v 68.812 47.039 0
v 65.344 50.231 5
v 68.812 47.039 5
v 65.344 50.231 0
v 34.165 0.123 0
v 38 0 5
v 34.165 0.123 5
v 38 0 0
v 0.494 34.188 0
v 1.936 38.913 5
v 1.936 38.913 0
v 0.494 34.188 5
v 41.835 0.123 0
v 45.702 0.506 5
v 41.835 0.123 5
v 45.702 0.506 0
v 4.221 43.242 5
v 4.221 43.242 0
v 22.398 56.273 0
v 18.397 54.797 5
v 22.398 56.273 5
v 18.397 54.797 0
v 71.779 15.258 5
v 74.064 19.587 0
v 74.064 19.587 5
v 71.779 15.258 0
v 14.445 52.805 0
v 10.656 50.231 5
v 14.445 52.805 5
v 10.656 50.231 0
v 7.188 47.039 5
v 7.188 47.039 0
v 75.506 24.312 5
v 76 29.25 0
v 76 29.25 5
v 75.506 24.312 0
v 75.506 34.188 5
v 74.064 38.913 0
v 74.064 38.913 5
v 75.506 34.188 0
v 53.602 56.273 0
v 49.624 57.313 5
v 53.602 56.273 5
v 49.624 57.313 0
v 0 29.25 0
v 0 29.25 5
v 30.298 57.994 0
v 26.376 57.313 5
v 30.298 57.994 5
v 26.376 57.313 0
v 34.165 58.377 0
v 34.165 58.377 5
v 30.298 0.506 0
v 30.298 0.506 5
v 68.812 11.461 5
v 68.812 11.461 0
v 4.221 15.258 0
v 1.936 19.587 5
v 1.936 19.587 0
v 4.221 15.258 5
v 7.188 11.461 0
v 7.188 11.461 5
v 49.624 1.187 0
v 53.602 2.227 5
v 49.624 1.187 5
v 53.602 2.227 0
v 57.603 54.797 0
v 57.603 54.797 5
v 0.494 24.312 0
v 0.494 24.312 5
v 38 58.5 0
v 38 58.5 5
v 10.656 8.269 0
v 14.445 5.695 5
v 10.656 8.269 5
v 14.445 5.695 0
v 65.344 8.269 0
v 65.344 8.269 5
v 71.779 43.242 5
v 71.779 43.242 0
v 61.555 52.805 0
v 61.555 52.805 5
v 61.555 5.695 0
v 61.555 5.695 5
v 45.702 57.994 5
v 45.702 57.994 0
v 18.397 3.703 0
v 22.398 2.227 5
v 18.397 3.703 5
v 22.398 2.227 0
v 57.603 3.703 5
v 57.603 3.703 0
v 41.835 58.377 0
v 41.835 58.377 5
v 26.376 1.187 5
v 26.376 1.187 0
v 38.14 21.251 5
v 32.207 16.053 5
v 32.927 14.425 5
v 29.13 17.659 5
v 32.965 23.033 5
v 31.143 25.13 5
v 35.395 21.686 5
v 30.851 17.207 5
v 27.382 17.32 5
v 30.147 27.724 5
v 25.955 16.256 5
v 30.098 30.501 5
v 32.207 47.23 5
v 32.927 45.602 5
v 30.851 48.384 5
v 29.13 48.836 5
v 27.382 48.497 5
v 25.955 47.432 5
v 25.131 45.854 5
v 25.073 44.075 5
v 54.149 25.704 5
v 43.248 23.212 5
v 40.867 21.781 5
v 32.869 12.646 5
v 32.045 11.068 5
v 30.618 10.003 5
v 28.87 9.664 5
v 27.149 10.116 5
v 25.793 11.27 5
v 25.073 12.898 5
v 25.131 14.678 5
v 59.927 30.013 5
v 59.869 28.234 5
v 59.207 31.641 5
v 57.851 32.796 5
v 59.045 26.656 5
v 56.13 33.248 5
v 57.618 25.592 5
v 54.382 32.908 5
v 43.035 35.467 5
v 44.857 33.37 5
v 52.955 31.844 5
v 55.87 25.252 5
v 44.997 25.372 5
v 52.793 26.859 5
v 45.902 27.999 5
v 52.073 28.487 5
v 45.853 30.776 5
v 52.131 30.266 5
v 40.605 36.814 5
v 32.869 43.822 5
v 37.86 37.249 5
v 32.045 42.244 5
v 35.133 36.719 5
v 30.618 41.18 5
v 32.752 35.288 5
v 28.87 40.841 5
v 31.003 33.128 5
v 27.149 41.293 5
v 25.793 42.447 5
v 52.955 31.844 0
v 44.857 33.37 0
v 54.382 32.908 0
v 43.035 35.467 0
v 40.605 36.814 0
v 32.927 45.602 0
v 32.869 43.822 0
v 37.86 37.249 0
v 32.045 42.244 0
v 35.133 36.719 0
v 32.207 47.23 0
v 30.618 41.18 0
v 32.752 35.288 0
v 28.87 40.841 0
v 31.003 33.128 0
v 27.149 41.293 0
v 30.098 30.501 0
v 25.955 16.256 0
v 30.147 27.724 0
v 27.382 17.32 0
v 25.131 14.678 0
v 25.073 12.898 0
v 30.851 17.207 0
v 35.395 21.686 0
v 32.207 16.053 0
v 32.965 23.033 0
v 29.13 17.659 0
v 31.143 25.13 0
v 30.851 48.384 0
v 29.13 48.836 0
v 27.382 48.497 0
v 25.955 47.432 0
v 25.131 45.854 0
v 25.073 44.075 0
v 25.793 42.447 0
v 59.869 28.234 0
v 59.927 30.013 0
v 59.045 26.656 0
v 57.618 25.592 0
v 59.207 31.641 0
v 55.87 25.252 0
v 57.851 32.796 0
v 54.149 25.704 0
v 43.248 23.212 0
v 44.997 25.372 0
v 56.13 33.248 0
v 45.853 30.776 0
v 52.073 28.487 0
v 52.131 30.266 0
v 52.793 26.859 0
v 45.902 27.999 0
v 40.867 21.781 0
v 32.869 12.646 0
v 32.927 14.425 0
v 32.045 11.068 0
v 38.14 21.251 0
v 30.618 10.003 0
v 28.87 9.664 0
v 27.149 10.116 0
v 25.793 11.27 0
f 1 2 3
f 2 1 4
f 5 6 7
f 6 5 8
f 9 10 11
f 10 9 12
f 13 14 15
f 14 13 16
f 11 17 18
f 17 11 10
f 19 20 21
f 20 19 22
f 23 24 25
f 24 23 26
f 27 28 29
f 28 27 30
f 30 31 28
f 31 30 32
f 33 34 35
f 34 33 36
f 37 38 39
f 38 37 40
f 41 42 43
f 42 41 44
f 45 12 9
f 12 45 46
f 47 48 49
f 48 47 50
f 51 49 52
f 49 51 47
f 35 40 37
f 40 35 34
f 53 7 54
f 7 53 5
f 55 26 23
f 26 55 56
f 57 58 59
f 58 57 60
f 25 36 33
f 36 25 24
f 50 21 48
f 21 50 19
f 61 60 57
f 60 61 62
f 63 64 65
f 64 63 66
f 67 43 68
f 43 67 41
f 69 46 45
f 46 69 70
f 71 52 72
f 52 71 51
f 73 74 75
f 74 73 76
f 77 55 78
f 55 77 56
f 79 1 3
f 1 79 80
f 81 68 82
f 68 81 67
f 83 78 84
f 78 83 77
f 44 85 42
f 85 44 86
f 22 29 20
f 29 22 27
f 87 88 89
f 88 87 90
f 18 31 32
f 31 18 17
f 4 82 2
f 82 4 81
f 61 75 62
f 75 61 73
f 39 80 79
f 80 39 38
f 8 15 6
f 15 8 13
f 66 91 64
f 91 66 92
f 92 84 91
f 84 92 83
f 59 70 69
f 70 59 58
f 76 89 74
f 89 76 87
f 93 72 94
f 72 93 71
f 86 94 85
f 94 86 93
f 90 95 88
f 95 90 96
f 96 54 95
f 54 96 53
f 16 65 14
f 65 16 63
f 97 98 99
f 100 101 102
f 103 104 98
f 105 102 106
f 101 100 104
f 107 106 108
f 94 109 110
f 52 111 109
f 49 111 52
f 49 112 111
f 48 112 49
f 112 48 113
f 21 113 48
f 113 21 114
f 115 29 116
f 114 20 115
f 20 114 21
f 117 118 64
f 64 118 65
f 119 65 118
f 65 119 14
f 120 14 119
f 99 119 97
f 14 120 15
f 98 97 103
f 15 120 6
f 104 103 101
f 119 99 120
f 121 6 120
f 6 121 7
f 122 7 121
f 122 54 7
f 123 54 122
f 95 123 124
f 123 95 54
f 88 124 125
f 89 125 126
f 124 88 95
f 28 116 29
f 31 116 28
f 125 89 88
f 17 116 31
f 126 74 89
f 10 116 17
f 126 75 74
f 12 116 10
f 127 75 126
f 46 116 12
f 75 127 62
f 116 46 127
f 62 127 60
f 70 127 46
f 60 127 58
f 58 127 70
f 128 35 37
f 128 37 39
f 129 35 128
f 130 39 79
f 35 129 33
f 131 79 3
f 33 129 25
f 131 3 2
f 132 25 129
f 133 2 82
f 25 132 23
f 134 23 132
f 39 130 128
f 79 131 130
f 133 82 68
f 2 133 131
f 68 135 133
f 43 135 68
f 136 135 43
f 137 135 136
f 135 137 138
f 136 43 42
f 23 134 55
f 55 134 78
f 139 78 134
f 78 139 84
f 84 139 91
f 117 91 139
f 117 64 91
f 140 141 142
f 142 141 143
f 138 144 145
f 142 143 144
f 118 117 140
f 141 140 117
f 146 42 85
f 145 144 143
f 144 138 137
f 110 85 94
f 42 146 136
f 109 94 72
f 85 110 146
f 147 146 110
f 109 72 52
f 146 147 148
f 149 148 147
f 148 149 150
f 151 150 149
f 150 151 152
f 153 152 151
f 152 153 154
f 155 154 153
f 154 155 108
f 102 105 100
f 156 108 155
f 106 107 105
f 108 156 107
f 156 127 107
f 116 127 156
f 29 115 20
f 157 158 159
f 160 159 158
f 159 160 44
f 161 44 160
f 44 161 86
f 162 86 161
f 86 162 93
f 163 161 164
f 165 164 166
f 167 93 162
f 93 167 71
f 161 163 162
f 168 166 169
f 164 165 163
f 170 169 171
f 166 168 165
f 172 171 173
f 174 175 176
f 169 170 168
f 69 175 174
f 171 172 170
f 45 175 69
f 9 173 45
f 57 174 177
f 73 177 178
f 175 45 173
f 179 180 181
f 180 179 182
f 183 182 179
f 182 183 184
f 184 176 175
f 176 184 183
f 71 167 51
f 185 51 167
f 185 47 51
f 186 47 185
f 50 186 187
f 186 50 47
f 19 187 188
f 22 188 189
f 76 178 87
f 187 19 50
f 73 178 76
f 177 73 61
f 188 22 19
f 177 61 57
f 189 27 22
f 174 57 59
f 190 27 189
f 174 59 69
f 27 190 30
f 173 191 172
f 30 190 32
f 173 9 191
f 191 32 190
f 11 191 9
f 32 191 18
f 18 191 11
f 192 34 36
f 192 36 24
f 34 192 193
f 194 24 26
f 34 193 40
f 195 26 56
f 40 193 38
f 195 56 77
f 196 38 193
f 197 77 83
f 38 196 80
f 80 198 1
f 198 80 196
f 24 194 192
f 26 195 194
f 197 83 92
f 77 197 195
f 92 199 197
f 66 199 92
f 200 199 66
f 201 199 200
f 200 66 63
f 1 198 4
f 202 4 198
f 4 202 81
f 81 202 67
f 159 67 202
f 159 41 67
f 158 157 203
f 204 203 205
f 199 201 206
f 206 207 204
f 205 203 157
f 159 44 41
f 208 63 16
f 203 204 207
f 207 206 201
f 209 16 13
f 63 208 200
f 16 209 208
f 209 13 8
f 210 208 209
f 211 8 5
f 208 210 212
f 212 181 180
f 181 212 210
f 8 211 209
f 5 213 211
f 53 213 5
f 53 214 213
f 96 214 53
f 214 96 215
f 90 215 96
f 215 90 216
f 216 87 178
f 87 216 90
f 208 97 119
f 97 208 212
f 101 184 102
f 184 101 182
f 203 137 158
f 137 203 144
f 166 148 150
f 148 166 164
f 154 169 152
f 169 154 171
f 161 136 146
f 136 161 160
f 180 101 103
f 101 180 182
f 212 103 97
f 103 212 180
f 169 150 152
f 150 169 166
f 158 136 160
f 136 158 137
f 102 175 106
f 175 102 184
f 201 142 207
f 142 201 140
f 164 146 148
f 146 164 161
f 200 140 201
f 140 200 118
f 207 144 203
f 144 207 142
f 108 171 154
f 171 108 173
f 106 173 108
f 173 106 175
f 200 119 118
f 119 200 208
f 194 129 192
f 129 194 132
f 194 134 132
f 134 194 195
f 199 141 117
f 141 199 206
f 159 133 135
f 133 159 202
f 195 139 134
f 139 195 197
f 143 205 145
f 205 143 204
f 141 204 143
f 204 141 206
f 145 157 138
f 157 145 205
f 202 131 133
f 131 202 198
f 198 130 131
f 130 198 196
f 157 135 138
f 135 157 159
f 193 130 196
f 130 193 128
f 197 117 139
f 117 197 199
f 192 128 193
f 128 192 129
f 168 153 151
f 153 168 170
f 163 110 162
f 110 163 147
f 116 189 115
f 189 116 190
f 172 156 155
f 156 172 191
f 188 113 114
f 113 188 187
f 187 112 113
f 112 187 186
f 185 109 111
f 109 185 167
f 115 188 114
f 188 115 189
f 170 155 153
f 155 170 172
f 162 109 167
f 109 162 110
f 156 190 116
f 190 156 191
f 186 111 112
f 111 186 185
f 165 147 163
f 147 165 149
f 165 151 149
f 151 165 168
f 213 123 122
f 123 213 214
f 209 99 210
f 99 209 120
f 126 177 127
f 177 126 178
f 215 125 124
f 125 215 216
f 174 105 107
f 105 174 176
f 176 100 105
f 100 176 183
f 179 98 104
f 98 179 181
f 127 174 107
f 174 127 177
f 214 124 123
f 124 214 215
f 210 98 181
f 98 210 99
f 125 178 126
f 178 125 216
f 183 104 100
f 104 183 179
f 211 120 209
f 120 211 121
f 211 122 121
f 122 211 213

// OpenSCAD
$fn = 32;

// ----------------------------------------------------------------------
// Cam plate: double_lobe cam, base R28
// ----------------------------------------------------------------------

// --- parameters (mm) ---
base_r = 28;              // base circle radius
lobe_h = 10;              // cam lobe rise
bore_r = 8;               // shaft bore radius
plate_t = 5;              // plate thickness, Z (extrusion height)
ring_r = 18;              // lightening ring radius
bolt_r = 4;               // lightening hole radius

profile = [[76, 29.25], [75.506, 34.188], [74.064, 38.913], [71.779, 43.242], [68.812, 47.039], [65.344, 50.231], [61.555, 52.805], [57.603, 54.797], [53.602, 56.273], [49.624, 57.313], [45.702, 57.994], [41.835, 58.377], [38, 58.5], [34.165, 58.377], [30.298, 57.994], [26.376, 57.313], [22.398, 56.273], [18.397, 54.797], [14.445, 52.805], [10.656, 50.231], [7.188, 47.039], [4.221, 43.242], [1.936, 38.913], [0.494, 34.188], [0, 29.25], [0.494, 24.312], [1.936, 19.587], [4.221, 15.258], [7.188, 11.461], [10.656, 8.269], [14.445, 5.695], [18.397, 3.703], [22.398, 2.227], [26.376, 1.187], [30.298, 0.506], [34.165, 0.123], [38, 0], [41.835, 0.123], [45.702, 0.506], [49.624, 1.187], [53.602, 2.227], [57.603, 3.703], [61.555, 5.695], [65.344, 8.269], [68.812, 11.461], [71.779, 15.258], [74.064, 19.587], [75.506, 24.312]];  // primary outline, 48 points, counter clockwise
void_1 = [[45.853, 30.776], [44.857, 33.37], [43.035, 35.467], [40.605, 36.814], [37.86, 37.249], [35.133, 36.719], [32.752, 35.288], [31.003, 33.128], [30.098, 30.501], [30.147, 27.724], [31.143, 25.13], [32.965, 23.033], [35.395, 21.686], [38.14, 21.251], [40.867, 21.781], [43.248, 23.212], [44.997, 25.372], [45.902, 27.999]];  // shaft bore, 18 points
void_2 = [[59.927, 30.013], [59.207, 31.641], [57.851, 32.796], [56.13, 33.248], [54.382, 32.908], [52.955, 31.844], [52.131, 30.266], [52.073, 28.487], [52.793, 26.859], [54.149, 25.704], [55.87, 25.252], [57.618, 25.592], [59.045, 26.656], [59.869, 28.234]];  // lightening hole 1, 14 points
void_3 = [[32.927, 45.602], [32.207, 47.23], [30.851, 48.384], [29.13, 48.836], [27.382, 48.497], [25.955, 47.432], [25.131, 45.854], [25.073, 44.075], [25.793, 42.447], [27.149, 41.293], [28.87, 40.841], [30.618, 41.18], [32.045, 42.244], [32.869, 43.822]];  // lightening hole 2, 14 points
void_4 = [[32.927, 14.425], [32.207, 16.053], [30.851, 17.207], [29.13, 17.659], [27.382, 17.32], [25.955, 16.256], [25.131, 14.678], [25.073, 12.898], [25.793, 11.27], [27.149, 10.116], [28.87, 9.664], [30.618, 10.003], [32.045, 11.068], [32.869, 12.646]];  // lightening hole 3, 14 points

// --- the one profile operation ---
difference() {
  linear_extrude(height = plate_t) polygon(points = profile);
  translate([0, 0, -1])
    linear_extrude(height = plate_t + 2) polygon(points = void_1);
  translate([0, 0, -1])
    linear_extrude(height = plate_t + 2) polygon(points = void_2);
  translate([0, 0, -1])
    linear_extrude(height = plate_t + 2) polygon(points = void_3);
  translate([0, 0, -1])
    linear_extrude(height = plate_t + 2) polygon(points = void_4);
}
